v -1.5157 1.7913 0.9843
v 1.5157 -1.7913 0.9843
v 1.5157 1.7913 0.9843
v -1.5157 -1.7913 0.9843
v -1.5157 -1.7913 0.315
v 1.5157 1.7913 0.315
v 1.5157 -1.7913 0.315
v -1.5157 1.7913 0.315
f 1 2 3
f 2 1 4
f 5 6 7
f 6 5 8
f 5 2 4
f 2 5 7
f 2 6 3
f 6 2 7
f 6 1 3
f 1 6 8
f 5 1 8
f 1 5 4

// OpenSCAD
// file: defines.scad
w = 9.7;
h = 10.10;
t = 2.5;
pcb_t = 0.8;
pin_fragments = 16;

scale = 1/2.54;
// main file
// example012.stl is Mblock.stl, (c) 2009 Will Langford
// licensed under the Creative Commons - GNU GPL license.
// http://www.thingiverse.com/thing:753

//import("sim800c.stl", convexity=3);

// PCB

include <defines.scad>

// SHIELD

sw = w - 2.0;
sh = h - 1.0;

color("Silver")
  scale(scale)
  translate([-sw/2, -sh/2, pcb_t])
    cube(size = [sw, sh, t - pcb_t], center = false);
